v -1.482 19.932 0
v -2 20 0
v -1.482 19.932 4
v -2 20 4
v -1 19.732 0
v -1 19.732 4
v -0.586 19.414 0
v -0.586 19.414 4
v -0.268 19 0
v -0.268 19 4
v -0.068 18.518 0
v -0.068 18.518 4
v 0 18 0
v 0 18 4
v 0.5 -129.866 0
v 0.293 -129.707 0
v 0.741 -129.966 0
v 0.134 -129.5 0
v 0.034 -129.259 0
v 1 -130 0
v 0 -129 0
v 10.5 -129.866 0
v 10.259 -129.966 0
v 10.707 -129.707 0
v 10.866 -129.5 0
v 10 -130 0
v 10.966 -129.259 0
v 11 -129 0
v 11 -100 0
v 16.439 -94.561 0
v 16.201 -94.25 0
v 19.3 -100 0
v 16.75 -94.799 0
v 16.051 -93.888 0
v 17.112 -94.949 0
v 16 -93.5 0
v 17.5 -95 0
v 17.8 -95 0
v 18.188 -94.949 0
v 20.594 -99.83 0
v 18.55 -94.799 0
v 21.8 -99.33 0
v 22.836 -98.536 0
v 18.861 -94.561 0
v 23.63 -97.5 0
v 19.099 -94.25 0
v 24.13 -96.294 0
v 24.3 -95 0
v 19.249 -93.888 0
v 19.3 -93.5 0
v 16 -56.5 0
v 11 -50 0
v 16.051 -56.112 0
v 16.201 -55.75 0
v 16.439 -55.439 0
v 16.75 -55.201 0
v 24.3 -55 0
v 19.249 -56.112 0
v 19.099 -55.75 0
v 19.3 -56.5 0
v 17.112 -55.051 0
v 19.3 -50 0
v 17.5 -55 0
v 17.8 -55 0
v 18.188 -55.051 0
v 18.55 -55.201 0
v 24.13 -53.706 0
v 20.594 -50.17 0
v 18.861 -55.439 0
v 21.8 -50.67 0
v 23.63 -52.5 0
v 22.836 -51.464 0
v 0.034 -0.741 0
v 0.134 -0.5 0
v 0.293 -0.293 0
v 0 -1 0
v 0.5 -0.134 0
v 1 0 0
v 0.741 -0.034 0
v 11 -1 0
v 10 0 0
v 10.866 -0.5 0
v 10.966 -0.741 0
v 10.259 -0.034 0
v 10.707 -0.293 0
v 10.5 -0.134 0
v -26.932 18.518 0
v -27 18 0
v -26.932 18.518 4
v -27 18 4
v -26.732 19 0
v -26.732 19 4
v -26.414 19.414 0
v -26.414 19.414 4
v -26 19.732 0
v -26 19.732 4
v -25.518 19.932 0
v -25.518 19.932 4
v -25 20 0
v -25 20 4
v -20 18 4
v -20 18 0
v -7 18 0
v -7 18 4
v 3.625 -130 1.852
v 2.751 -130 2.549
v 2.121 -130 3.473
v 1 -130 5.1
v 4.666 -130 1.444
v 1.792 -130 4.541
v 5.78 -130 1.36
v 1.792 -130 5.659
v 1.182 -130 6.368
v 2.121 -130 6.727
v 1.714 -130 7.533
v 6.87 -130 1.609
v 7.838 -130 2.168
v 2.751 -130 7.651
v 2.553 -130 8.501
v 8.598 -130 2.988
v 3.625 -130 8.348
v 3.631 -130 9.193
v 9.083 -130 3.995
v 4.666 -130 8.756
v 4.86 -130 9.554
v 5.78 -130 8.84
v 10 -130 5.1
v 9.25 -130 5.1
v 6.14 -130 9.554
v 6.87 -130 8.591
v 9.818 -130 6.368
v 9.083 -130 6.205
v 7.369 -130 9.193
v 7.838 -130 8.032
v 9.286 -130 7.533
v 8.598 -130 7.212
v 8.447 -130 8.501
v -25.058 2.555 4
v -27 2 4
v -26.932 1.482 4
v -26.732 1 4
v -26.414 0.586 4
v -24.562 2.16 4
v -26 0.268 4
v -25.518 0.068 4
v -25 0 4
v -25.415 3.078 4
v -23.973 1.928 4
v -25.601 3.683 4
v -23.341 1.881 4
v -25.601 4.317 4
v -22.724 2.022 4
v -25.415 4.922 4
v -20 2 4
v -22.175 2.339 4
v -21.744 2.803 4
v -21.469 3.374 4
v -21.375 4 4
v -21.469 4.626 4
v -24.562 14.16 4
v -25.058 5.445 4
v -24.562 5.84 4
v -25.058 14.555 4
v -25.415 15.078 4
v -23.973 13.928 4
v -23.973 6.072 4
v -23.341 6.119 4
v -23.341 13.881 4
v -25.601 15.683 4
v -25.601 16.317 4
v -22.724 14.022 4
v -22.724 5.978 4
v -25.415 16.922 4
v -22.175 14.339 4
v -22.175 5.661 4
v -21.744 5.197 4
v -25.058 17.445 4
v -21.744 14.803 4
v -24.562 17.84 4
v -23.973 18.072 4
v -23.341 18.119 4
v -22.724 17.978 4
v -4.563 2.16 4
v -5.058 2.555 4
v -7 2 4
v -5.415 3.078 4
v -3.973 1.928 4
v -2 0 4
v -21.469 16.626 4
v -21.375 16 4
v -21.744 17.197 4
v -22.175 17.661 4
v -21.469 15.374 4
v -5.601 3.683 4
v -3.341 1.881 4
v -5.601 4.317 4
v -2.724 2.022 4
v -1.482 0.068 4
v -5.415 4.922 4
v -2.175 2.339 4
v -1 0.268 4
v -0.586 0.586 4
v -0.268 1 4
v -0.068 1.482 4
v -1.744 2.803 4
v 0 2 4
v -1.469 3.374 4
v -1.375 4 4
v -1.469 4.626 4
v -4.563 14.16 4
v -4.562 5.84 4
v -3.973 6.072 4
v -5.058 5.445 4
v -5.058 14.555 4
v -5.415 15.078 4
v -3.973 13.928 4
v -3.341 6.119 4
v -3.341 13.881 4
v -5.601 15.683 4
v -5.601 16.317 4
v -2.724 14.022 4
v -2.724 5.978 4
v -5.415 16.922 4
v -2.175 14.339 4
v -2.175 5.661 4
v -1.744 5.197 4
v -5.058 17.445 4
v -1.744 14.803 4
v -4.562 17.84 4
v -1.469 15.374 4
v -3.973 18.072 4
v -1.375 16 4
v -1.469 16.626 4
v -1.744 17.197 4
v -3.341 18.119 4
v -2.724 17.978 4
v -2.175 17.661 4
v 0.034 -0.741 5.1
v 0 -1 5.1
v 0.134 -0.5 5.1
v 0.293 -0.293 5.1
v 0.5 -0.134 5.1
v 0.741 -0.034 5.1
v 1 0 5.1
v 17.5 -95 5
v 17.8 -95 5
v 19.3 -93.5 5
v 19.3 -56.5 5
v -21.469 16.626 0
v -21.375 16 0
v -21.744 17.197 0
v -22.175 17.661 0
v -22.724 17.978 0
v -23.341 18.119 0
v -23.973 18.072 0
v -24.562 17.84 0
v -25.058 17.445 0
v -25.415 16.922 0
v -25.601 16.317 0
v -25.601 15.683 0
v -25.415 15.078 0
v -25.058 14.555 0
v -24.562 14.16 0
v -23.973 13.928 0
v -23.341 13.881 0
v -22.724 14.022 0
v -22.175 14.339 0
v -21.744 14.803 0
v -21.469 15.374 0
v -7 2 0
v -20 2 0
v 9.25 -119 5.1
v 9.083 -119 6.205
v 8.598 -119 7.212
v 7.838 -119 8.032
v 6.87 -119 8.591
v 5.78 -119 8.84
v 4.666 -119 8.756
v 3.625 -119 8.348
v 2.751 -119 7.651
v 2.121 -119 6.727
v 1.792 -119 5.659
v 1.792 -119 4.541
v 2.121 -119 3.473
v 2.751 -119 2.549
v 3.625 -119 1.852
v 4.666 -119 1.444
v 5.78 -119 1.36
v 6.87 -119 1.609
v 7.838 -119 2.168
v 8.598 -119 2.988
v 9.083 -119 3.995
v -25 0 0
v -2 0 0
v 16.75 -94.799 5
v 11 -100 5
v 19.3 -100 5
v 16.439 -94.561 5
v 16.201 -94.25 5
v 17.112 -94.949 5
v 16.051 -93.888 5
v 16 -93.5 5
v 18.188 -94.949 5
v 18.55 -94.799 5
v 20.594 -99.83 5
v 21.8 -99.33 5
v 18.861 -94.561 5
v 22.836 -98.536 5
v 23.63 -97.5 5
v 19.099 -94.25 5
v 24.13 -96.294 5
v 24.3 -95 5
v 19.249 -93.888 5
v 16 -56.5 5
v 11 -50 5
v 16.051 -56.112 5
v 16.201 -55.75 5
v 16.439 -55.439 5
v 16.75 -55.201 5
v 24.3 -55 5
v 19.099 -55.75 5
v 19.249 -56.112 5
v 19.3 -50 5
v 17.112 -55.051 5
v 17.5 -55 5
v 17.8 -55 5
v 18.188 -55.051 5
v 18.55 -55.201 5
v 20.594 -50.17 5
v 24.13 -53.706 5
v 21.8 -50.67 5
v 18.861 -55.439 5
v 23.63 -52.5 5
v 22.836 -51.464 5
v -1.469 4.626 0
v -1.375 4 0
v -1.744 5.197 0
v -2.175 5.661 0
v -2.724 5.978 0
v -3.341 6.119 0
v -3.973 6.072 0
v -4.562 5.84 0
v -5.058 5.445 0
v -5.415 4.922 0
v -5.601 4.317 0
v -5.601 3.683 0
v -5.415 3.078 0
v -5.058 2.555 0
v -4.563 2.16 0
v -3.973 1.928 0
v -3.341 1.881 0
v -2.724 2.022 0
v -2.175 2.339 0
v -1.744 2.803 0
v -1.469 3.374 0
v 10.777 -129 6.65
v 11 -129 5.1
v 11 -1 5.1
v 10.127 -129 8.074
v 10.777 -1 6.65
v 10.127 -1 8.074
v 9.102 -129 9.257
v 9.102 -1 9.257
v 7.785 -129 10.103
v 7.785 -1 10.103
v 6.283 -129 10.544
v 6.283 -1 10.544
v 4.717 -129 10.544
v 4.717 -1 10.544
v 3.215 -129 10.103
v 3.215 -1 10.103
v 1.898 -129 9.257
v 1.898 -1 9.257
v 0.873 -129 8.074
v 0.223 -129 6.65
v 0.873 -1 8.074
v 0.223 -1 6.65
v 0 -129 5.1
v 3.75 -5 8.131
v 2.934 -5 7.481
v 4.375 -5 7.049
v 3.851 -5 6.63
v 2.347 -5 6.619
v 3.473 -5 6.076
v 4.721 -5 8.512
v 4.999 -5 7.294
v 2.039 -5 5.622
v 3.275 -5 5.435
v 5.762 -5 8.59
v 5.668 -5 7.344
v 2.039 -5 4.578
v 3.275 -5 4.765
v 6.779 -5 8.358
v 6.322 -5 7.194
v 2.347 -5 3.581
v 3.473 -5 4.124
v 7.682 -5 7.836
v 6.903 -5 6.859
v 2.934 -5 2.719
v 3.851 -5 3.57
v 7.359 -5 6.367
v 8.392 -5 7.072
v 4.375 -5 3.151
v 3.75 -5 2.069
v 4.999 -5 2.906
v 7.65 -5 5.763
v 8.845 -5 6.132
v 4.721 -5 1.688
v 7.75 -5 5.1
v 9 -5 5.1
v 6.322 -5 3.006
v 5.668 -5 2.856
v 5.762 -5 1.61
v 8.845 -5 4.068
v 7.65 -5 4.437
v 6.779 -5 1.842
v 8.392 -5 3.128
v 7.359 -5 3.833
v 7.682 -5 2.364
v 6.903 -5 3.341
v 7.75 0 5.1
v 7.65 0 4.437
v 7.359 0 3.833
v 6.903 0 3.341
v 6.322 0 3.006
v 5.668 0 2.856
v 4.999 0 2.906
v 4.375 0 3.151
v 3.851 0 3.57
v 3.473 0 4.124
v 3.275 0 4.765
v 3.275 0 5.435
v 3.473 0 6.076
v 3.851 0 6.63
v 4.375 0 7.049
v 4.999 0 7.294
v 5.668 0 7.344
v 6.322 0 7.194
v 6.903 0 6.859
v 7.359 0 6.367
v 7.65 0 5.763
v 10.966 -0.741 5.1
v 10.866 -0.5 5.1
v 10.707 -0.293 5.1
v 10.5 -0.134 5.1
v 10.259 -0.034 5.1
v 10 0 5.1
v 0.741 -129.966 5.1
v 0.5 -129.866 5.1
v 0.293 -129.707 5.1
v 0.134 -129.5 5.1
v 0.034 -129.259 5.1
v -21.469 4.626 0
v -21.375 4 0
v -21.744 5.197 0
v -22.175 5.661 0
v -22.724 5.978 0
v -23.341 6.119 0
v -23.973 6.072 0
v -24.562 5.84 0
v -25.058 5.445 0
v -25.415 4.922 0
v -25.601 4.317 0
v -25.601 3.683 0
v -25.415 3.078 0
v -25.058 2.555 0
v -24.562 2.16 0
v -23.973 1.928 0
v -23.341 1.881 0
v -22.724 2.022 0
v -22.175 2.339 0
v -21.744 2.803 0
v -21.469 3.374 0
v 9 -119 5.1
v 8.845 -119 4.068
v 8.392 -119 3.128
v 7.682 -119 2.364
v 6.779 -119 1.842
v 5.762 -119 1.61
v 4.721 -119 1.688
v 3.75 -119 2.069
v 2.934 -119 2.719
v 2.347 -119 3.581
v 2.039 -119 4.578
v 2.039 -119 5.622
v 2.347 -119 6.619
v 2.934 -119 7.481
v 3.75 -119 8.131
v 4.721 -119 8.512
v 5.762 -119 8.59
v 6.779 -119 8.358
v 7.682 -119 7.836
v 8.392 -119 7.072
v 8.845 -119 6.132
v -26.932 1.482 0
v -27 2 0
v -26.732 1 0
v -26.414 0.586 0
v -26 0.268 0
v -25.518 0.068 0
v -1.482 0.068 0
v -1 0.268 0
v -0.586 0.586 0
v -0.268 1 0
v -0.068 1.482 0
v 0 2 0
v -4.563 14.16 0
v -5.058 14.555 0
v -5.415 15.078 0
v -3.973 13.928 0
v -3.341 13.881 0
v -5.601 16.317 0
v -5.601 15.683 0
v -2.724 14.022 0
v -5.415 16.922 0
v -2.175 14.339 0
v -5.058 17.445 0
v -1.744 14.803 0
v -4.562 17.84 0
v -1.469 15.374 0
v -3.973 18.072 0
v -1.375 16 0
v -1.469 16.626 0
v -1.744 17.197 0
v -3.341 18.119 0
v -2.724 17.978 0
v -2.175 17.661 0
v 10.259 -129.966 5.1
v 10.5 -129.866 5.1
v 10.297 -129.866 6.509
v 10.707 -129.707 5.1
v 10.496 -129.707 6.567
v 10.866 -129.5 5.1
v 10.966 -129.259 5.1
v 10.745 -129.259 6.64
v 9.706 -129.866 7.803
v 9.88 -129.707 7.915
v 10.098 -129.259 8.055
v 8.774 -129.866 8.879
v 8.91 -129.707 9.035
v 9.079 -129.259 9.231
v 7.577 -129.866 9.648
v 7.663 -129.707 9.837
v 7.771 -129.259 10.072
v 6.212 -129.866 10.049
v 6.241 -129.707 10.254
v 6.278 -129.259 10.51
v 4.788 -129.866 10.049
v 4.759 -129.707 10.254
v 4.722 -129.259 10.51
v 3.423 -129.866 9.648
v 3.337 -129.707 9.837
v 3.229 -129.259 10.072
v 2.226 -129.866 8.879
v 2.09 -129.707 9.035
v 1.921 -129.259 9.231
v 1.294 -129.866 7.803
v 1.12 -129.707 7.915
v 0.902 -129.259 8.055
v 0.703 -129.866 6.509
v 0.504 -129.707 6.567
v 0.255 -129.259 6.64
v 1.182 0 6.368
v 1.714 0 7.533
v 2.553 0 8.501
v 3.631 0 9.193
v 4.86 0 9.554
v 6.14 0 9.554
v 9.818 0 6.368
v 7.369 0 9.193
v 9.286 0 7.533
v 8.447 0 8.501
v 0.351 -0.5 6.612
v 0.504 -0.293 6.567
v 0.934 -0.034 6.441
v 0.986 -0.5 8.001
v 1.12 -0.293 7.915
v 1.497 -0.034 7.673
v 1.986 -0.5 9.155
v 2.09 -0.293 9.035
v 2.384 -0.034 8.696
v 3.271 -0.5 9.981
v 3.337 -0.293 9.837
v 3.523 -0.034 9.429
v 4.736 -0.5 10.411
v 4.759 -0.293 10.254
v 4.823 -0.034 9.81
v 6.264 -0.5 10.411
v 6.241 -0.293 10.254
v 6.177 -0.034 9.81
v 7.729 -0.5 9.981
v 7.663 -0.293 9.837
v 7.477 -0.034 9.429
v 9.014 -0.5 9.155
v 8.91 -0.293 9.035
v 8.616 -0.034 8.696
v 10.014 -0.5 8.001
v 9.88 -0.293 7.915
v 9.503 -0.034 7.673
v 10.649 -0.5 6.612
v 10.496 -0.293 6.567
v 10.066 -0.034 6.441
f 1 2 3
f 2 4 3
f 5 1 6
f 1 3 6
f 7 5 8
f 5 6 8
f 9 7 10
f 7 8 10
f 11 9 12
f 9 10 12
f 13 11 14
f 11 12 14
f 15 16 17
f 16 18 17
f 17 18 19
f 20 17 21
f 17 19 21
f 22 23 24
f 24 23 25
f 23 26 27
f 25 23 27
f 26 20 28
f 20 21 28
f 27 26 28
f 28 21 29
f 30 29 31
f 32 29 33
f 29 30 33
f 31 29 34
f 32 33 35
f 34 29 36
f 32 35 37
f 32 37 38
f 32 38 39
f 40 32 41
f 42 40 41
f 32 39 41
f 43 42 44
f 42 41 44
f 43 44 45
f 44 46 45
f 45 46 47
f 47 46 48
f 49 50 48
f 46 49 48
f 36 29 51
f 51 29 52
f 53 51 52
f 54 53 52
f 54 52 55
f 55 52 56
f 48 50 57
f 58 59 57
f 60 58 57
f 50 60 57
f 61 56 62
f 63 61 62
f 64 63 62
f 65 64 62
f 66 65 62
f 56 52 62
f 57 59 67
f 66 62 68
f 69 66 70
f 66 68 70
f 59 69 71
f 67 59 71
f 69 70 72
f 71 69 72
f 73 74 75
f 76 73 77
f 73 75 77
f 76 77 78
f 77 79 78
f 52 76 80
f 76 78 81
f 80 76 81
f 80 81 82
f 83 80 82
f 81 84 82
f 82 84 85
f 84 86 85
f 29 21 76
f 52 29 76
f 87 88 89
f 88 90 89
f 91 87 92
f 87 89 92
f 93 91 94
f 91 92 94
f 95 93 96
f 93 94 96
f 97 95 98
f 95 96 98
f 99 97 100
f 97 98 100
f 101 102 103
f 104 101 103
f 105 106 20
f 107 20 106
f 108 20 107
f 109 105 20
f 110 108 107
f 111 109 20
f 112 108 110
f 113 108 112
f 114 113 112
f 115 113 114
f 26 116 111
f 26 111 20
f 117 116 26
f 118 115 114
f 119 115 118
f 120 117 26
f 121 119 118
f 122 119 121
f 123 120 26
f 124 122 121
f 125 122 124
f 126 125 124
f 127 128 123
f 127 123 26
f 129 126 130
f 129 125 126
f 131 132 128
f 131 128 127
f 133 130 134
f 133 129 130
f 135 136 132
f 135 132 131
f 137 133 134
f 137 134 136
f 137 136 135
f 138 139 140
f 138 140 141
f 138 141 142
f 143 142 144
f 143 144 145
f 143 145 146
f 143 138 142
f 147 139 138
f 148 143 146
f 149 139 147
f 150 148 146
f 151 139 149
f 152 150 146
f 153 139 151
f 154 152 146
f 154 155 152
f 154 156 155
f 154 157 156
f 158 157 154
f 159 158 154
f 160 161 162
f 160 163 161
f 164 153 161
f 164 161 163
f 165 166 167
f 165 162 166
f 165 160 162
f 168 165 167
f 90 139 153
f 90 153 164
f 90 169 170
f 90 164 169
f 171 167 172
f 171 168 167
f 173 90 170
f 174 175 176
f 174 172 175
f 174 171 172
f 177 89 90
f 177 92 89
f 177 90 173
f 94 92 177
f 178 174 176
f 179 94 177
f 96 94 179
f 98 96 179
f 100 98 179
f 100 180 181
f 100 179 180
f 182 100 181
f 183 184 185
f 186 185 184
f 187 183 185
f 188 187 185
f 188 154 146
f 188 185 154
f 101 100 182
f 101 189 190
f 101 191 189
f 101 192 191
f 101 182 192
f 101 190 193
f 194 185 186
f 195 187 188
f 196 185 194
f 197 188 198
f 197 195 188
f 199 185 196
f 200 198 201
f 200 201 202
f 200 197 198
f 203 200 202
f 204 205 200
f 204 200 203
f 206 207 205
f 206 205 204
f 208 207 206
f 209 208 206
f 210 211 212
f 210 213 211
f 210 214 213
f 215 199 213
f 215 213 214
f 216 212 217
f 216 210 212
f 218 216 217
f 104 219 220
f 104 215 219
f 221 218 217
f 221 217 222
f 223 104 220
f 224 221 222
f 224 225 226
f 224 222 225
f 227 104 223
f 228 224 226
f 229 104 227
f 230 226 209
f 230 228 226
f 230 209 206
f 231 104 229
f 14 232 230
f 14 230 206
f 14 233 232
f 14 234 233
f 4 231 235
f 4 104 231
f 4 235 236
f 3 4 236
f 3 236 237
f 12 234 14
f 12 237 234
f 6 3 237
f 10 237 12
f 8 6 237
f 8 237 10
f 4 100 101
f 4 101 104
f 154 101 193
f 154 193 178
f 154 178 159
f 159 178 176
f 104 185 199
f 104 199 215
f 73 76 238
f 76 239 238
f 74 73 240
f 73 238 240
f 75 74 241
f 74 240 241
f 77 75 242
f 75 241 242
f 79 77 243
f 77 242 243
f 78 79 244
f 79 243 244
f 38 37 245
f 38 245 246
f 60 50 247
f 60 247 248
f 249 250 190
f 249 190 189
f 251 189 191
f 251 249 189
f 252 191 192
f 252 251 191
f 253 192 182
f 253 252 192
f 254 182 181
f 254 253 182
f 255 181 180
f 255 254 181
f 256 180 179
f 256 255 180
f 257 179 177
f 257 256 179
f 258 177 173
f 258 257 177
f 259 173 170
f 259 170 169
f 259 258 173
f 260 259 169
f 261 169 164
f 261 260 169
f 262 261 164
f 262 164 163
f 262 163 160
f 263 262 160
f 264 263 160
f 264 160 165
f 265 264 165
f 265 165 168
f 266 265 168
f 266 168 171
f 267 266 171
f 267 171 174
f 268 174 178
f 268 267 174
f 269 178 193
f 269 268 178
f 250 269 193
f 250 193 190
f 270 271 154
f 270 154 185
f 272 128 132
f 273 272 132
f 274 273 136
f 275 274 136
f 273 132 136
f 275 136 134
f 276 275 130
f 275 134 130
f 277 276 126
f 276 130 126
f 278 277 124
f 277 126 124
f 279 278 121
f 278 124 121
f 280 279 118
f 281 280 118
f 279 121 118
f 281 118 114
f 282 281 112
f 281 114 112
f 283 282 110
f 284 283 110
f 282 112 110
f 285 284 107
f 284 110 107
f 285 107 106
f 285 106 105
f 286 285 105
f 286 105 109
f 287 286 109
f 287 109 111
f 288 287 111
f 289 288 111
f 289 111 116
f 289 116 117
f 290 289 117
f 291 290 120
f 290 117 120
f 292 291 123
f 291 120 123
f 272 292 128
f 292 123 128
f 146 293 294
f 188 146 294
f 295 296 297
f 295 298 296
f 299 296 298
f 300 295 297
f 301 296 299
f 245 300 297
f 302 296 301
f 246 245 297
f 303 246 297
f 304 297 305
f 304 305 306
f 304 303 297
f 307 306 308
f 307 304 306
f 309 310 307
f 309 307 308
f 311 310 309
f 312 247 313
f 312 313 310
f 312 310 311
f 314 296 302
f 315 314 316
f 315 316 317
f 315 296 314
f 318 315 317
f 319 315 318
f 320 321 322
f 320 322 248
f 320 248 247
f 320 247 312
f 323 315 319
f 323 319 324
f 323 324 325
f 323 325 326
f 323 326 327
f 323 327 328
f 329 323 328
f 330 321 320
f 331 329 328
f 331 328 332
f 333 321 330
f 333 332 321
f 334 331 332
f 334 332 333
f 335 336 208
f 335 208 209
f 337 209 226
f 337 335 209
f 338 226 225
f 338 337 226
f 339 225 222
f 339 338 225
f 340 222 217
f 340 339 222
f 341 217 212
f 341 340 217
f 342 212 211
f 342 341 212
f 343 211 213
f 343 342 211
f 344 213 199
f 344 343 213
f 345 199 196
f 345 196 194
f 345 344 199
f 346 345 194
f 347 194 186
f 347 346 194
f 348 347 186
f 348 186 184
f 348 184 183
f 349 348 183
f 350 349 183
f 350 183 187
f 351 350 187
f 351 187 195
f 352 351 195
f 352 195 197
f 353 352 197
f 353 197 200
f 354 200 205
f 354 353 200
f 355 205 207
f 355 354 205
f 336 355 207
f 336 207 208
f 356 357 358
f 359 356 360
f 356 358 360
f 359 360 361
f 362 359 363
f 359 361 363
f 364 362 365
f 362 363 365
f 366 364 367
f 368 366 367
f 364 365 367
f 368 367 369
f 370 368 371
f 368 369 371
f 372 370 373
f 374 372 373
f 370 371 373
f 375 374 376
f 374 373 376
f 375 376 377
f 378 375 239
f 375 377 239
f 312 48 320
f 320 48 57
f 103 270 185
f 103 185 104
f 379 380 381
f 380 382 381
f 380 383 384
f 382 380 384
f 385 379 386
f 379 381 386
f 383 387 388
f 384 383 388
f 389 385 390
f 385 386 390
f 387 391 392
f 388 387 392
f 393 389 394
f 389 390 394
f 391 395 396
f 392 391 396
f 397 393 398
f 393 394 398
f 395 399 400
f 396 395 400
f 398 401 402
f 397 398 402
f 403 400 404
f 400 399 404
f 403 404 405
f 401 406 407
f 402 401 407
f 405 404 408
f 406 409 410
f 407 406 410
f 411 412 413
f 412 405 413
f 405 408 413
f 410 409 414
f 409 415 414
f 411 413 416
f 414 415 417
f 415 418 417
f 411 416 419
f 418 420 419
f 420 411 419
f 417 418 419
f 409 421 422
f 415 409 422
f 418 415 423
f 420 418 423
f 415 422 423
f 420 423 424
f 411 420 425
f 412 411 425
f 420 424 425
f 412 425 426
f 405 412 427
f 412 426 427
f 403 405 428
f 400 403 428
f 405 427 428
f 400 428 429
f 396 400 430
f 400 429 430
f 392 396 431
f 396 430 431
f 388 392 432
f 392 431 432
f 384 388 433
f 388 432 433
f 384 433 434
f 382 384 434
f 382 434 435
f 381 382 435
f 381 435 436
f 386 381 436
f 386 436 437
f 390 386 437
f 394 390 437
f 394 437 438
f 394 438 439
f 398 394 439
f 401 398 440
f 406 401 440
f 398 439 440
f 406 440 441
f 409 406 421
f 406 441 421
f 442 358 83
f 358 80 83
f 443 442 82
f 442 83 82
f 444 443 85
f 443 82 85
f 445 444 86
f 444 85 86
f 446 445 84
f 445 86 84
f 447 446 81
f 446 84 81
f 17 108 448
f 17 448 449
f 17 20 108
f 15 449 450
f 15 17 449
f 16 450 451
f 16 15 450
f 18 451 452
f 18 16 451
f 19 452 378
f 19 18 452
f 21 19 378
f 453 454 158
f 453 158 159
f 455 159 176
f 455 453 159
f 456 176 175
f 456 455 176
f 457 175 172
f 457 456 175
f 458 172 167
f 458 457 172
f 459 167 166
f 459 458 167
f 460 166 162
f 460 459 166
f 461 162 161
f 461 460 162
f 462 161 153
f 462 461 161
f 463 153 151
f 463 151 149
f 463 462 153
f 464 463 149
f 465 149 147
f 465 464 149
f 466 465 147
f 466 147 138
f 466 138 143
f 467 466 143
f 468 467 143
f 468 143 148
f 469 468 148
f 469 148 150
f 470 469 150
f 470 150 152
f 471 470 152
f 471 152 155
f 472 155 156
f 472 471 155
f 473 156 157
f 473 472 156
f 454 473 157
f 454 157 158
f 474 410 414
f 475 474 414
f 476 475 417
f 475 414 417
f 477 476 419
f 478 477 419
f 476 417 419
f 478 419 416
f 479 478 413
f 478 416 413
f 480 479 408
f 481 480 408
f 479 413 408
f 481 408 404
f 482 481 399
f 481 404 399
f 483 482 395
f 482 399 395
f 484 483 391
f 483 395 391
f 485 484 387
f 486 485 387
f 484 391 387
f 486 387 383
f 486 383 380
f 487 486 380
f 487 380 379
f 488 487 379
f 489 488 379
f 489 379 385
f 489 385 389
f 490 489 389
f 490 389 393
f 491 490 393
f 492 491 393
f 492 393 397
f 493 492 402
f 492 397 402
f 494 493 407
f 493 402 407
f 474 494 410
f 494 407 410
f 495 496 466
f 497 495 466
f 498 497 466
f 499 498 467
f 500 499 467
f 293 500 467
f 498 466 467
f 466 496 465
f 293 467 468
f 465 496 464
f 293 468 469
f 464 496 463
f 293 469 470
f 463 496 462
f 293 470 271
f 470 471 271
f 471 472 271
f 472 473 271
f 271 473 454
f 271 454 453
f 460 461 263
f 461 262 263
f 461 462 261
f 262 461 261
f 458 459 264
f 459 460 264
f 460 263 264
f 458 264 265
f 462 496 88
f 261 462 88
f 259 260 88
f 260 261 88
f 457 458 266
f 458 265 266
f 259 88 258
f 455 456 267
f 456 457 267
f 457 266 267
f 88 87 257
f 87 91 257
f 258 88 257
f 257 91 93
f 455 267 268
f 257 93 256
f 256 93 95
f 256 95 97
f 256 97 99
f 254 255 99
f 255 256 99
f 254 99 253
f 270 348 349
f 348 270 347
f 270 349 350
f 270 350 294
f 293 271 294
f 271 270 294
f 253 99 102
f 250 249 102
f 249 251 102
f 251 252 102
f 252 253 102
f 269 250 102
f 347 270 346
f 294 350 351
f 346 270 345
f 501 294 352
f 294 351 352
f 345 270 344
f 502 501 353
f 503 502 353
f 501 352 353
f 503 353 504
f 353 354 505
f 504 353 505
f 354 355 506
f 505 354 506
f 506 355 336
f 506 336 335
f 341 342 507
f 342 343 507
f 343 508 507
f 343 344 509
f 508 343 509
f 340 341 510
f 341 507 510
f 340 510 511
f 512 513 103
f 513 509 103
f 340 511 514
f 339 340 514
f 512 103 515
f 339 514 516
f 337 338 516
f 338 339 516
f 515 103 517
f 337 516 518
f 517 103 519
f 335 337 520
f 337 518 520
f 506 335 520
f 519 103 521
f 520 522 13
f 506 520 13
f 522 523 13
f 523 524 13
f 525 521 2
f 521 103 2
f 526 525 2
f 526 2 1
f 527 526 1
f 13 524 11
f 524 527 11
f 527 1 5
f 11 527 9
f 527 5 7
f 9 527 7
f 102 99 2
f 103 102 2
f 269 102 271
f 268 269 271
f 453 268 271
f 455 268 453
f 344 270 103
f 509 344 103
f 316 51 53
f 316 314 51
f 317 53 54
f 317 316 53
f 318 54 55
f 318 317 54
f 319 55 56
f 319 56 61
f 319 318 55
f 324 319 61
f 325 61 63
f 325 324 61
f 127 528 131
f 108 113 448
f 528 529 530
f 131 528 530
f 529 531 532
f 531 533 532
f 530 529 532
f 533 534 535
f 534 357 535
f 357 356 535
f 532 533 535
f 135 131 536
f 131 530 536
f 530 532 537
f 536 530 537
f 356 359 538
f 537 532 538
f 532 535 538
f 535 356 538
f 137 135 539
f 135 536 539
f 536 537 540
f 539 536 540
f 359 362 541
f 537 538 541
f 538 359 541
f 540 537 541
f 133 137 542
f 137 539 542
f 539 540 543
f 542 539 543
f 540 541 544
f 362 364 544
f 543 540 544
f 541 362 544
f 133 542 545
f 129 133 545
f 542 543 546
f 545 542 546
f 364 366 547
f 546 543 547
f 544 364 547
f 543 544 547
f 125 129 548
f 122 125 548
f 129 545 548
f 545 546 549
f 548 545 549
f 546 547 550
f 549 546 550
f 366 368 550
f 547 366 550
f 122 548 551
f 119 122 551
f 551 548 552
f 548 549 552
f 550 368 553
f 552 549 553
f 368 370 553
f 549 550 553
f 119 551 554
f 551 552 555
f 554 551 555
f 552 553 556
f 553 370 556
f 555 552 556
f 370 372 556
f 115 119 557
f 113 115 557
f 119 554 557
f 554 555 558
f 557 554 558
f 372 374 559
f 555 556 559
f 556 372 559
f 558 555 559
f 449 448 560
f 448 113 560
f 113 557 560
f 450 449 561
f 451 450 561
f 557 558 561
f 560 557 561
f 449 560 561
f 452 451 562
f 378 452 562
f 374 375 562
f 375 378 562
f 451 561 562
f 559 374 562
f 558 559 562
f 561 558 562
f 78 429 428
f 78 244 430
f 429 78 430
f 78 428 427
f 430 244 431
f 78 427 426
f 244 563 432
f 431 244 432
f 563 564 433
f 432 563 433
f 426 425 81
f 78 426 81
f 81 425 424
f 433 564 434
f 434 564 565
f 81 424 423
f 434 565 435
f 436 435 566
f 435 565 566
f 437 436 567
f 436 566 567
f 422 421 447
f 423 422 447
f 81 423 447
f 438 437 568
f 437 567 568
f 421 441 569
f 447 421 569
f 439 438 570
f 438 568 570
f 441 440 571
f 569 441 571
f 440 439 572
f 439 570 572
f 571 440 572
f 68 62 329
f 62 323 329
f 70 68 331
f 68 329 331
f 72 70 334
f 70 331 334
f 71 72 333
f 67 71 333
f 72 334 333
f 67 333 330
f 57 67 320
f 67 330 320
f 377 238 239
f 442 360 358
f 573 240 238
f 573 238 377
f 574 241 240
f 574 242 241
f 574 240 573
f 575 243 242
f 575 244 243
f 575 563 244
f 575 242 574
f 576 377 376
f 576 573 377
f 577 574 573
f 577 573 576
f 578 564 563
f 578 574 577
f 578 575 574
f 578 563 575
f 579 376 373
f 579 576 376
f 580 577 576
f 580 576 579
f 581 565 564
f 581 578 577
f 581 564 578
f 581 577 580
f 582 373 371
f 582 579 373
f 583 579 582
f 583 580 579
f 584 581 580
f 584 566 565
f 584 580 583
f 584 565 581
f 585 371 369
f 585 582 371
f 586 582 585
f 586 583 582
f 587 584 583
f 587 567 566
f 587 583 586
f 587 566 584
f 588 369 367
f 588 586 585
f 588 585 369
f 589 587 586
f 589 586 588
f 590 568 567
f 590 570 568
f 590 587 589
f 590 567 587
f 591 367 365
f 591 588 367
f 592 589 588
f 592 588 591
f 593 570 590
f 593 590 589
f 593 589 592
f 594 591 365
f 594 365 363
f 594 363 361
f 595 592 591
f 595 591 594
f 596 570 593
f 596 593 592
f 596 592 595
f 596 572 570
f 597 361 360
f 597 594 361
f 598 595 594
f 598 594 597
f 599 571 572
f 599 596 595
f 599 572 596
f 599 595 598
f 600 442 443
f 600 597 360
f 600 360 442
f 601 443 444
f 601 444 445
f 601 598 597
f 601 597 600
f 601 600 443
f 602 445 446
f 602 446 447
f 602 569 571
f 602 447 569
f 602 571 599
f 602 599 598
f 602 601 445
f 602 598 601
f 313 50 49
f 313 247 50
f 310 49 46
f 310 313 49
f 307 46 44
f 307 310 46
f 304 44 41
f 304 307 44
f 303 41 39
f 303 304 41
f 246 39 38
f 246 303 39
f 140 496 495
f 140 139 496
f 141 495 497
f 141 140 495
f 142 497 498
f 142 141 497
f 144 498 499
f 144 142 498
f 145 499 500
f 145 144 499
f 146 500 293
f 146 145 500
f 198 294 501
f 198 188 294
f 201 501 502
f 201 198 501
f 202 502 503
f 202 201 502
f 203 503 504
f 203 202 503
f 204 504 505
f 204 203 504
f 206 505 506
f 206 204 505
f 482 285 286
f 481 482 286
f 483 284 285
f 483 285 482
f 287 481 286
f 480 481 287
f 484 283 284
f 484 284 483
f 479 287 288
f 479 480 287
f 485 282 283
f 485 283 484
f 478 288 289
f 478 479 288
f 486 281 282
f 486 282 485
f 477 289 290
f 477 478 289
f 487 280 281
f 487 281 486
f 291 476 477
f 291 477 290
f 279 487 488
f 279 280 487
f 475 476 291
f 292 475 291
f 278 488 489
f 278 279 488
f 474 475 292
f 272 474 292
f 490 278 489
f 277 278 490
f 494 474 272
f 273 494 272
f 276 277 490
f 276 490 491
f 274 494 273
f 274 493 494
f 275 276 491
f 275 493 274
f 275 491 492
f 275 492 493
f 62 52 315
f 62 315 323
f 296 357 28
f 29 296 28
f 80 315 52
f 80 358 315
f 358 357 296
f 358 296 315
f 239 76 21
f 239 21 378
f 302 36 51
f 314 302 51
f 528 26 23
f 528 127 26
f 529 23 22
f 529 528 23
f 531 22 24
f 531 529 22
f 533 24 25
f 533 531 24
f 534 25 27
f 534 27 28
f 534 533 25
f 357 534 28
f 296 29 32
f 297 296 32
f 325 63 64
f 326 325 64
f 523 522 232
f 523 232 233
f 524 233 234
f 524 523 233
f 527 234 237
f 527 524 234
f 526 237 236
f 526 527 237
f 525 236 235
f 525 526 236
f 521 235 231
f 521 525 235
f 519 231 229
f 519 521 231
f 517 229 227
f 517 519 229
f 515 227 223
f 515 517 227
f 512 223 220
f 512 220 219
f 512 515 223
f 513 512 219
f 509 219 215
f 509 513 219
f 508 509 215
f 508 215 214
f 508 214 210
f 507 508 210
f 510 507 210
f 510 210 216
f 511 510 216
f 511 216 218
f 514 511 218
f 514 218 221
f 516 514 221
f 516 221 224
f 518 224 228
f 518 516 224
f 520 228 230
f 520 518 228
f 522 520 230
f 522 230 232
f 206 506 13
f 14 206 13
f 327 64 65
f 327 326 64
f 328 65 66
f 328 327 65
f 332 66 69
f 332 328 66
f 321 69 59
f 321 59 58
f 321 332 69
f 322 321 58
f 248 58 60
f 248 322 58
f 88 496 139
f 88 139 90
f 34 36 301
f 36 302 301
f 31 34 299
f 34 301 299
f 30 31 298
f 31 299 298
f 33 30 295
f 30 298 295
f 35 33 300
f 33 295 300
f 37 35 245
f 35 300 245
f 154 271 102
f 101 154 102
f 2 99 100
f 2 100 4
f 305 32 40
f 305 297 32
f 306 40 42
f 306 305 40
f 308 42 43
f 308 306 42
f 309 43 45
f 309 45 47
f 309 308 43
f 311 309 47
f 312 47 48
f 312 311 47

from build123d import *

# Parameters (mm, degrees)
PAD_DEPTH       = 130
SKETCH001_R     = 2.25
POCKET_DEPTH    = 5
SKETCH002_R     = 3.5
POCKET001_DEPTH = 114
SKETCH003_R     = 3.75
POCKET002_DEPTH = 11
SKETCH004_W     = 13.3
SKETCH004_H     = 50
SKETCH004_W_2   = 3.3
SKETCH004_H_2   = 40
PAD001_DEPTH    = 5
FILLET_R        = 5
FILLET001_R     = 1.5
FILLET002_R     = 1
SKETCH005_W     = 27
SKETCH005_H     = 20
SKETCH005_R     = 2.125
SKETCH005_W_2   = 13
SKETCH005_H_2   = 16
PAD002_DEPTH    = 4
FILLET003_R     = 2


with BuildPart() as penholder:
    # Sketch → Pad (new body)
    with BuildSketch(Plane.XZ):
        with BuildLine():
            ThreePointArc((11, 5.1), (5.5, 10.6), (0, 5.1))
            Line((0, 0), (0, 5.1))
            Line((0, 0), (11, 0))
            Line((11, 5.1), (11, 0))
        make_face()
    extrude(amount=PAD_DEPTH)

    # Sketch001 (on Face5 of Pad) → Pocket (cut)
    with BuildSketch(Plane(origin=(0, 0, 0), x_dir=(1, 0, 0), z_dir=(0, 1, 0))):
        with Locations((5.5, -5.1)):
            Circle(SKETCH001_R)
    extrude(amount=-POCKET_DEPTH, mode=Mode.SUBTRACT)

    # Sketch002 (on Face8 of Pocket) → Pocket001 (cut)
    with BuildSketch(Plane(origin=(0, -5, 0), x_dir=(1, 0, 0), z_dir=(0, 1, 0))):
        with Locations((5.5, -5.1)):
            Circle(SKETCH002_R)
    extrude(amount=-POCKET001_DEPTH, mode=Mode.SUBTRACT)

    # Sketch003 (on Face5 of Pocket001) → Pocket002 (cut)
    with BuildSketch(Plane.XZ.offset(130)):
        with Locations((5.5, 5.1)):
            Circle(SKETCH003_R)
    extrude(amount=-POCKET002_DEPTH, mode=Mode.SUBTRACT)

    # Sketch004 → Pad001 (join)
    with BuildSketch(Plane.XY):
        with Locations((17.65, -75)):
            Rectangle(SKETCH004_W, SKETCH004_H)
        with Locations((17.65, -75)):
            Rectangle(SKETCH004_W_2, SKETCH004_H_2, mode=Mode.SUBTRACT)
    extrude(amount=PAD001_DEPTH)

    # Fillet
    fillet_edges = [penholder.edges().sort_by_distance(p)[0] for p in [
        (24.3, -50, 2.5),
        (24.3, -100, 2.5),
    ]]
    fillet(fillet_edges, radius=FILLET_R)

    # Fillet001
    fillet001_edges = [penholder.edges().sort_by_distance(p)[0] for p in [
        (16, -95, 2.5),
        (19.3, -95, 2.5),
        (19.3, -55, 2.5),
        (16, -55, 2.5),
    ]]
    fillet(fillet001_edges, radius=FILLET001_R)

    # Fillet002
    fillet002_edges = [penholder.edges().sort_by_distance(p)[0] for p in [
        (5.5, -130, 10.6),
        (11, -130, 2.55),
        (11, 0, 2.55),
        (5.5, 0, 10.6),
        (0, 0, 2.55),
        (0, -130, 2.55),
    ]]
    fillet(fillet002_edges, radius=FILLET002_R)


with BuildPart() as nutsholder:
    # Sketch005 → Pad002 (new body)
    with BuildSketch(Plane.XY):
        with Locations((-13.5, 10)):
            Rectangle(SKETCH005_W, SKETCH005_H)
        with Locations((-23.5, 16)):
            Circle(SKETCH005_R, mode=Mode.SUBTRACT)
        with Locations((-23.5, 4)):
            Circle(SKETCH005_R, mode=Mode.SUBTRACT)
        with Locations((-3.5, 4)):
            Circle(SKETCH005_R, mode=Mode.SUBTRACT)
        with Locations((-3.5, 16)):
            Circle(SKETCH005_R, mode=Mode.SUBTRACT)
        with Locations((-13.5, 10)):
            Rectangle(SKETCH005_W_2, SKETCH005_H_2, mode=Mode.SUBTRACT)
    extrude(amount=PAD002_DEPTH)

    # Fillet003
    fillet003_edges = [nutsholder.edges().sort_by_distance(p)[0] for p in [
        (-27, 20, 2),
        (-27, 0, 2),
        (0, 0, 2),
        (0, 20, 2),
    ]]
    fillet(fillet003_edges, radius=FILLET003_R)


solid = Compound([penholder.part, nutsholder.part])
